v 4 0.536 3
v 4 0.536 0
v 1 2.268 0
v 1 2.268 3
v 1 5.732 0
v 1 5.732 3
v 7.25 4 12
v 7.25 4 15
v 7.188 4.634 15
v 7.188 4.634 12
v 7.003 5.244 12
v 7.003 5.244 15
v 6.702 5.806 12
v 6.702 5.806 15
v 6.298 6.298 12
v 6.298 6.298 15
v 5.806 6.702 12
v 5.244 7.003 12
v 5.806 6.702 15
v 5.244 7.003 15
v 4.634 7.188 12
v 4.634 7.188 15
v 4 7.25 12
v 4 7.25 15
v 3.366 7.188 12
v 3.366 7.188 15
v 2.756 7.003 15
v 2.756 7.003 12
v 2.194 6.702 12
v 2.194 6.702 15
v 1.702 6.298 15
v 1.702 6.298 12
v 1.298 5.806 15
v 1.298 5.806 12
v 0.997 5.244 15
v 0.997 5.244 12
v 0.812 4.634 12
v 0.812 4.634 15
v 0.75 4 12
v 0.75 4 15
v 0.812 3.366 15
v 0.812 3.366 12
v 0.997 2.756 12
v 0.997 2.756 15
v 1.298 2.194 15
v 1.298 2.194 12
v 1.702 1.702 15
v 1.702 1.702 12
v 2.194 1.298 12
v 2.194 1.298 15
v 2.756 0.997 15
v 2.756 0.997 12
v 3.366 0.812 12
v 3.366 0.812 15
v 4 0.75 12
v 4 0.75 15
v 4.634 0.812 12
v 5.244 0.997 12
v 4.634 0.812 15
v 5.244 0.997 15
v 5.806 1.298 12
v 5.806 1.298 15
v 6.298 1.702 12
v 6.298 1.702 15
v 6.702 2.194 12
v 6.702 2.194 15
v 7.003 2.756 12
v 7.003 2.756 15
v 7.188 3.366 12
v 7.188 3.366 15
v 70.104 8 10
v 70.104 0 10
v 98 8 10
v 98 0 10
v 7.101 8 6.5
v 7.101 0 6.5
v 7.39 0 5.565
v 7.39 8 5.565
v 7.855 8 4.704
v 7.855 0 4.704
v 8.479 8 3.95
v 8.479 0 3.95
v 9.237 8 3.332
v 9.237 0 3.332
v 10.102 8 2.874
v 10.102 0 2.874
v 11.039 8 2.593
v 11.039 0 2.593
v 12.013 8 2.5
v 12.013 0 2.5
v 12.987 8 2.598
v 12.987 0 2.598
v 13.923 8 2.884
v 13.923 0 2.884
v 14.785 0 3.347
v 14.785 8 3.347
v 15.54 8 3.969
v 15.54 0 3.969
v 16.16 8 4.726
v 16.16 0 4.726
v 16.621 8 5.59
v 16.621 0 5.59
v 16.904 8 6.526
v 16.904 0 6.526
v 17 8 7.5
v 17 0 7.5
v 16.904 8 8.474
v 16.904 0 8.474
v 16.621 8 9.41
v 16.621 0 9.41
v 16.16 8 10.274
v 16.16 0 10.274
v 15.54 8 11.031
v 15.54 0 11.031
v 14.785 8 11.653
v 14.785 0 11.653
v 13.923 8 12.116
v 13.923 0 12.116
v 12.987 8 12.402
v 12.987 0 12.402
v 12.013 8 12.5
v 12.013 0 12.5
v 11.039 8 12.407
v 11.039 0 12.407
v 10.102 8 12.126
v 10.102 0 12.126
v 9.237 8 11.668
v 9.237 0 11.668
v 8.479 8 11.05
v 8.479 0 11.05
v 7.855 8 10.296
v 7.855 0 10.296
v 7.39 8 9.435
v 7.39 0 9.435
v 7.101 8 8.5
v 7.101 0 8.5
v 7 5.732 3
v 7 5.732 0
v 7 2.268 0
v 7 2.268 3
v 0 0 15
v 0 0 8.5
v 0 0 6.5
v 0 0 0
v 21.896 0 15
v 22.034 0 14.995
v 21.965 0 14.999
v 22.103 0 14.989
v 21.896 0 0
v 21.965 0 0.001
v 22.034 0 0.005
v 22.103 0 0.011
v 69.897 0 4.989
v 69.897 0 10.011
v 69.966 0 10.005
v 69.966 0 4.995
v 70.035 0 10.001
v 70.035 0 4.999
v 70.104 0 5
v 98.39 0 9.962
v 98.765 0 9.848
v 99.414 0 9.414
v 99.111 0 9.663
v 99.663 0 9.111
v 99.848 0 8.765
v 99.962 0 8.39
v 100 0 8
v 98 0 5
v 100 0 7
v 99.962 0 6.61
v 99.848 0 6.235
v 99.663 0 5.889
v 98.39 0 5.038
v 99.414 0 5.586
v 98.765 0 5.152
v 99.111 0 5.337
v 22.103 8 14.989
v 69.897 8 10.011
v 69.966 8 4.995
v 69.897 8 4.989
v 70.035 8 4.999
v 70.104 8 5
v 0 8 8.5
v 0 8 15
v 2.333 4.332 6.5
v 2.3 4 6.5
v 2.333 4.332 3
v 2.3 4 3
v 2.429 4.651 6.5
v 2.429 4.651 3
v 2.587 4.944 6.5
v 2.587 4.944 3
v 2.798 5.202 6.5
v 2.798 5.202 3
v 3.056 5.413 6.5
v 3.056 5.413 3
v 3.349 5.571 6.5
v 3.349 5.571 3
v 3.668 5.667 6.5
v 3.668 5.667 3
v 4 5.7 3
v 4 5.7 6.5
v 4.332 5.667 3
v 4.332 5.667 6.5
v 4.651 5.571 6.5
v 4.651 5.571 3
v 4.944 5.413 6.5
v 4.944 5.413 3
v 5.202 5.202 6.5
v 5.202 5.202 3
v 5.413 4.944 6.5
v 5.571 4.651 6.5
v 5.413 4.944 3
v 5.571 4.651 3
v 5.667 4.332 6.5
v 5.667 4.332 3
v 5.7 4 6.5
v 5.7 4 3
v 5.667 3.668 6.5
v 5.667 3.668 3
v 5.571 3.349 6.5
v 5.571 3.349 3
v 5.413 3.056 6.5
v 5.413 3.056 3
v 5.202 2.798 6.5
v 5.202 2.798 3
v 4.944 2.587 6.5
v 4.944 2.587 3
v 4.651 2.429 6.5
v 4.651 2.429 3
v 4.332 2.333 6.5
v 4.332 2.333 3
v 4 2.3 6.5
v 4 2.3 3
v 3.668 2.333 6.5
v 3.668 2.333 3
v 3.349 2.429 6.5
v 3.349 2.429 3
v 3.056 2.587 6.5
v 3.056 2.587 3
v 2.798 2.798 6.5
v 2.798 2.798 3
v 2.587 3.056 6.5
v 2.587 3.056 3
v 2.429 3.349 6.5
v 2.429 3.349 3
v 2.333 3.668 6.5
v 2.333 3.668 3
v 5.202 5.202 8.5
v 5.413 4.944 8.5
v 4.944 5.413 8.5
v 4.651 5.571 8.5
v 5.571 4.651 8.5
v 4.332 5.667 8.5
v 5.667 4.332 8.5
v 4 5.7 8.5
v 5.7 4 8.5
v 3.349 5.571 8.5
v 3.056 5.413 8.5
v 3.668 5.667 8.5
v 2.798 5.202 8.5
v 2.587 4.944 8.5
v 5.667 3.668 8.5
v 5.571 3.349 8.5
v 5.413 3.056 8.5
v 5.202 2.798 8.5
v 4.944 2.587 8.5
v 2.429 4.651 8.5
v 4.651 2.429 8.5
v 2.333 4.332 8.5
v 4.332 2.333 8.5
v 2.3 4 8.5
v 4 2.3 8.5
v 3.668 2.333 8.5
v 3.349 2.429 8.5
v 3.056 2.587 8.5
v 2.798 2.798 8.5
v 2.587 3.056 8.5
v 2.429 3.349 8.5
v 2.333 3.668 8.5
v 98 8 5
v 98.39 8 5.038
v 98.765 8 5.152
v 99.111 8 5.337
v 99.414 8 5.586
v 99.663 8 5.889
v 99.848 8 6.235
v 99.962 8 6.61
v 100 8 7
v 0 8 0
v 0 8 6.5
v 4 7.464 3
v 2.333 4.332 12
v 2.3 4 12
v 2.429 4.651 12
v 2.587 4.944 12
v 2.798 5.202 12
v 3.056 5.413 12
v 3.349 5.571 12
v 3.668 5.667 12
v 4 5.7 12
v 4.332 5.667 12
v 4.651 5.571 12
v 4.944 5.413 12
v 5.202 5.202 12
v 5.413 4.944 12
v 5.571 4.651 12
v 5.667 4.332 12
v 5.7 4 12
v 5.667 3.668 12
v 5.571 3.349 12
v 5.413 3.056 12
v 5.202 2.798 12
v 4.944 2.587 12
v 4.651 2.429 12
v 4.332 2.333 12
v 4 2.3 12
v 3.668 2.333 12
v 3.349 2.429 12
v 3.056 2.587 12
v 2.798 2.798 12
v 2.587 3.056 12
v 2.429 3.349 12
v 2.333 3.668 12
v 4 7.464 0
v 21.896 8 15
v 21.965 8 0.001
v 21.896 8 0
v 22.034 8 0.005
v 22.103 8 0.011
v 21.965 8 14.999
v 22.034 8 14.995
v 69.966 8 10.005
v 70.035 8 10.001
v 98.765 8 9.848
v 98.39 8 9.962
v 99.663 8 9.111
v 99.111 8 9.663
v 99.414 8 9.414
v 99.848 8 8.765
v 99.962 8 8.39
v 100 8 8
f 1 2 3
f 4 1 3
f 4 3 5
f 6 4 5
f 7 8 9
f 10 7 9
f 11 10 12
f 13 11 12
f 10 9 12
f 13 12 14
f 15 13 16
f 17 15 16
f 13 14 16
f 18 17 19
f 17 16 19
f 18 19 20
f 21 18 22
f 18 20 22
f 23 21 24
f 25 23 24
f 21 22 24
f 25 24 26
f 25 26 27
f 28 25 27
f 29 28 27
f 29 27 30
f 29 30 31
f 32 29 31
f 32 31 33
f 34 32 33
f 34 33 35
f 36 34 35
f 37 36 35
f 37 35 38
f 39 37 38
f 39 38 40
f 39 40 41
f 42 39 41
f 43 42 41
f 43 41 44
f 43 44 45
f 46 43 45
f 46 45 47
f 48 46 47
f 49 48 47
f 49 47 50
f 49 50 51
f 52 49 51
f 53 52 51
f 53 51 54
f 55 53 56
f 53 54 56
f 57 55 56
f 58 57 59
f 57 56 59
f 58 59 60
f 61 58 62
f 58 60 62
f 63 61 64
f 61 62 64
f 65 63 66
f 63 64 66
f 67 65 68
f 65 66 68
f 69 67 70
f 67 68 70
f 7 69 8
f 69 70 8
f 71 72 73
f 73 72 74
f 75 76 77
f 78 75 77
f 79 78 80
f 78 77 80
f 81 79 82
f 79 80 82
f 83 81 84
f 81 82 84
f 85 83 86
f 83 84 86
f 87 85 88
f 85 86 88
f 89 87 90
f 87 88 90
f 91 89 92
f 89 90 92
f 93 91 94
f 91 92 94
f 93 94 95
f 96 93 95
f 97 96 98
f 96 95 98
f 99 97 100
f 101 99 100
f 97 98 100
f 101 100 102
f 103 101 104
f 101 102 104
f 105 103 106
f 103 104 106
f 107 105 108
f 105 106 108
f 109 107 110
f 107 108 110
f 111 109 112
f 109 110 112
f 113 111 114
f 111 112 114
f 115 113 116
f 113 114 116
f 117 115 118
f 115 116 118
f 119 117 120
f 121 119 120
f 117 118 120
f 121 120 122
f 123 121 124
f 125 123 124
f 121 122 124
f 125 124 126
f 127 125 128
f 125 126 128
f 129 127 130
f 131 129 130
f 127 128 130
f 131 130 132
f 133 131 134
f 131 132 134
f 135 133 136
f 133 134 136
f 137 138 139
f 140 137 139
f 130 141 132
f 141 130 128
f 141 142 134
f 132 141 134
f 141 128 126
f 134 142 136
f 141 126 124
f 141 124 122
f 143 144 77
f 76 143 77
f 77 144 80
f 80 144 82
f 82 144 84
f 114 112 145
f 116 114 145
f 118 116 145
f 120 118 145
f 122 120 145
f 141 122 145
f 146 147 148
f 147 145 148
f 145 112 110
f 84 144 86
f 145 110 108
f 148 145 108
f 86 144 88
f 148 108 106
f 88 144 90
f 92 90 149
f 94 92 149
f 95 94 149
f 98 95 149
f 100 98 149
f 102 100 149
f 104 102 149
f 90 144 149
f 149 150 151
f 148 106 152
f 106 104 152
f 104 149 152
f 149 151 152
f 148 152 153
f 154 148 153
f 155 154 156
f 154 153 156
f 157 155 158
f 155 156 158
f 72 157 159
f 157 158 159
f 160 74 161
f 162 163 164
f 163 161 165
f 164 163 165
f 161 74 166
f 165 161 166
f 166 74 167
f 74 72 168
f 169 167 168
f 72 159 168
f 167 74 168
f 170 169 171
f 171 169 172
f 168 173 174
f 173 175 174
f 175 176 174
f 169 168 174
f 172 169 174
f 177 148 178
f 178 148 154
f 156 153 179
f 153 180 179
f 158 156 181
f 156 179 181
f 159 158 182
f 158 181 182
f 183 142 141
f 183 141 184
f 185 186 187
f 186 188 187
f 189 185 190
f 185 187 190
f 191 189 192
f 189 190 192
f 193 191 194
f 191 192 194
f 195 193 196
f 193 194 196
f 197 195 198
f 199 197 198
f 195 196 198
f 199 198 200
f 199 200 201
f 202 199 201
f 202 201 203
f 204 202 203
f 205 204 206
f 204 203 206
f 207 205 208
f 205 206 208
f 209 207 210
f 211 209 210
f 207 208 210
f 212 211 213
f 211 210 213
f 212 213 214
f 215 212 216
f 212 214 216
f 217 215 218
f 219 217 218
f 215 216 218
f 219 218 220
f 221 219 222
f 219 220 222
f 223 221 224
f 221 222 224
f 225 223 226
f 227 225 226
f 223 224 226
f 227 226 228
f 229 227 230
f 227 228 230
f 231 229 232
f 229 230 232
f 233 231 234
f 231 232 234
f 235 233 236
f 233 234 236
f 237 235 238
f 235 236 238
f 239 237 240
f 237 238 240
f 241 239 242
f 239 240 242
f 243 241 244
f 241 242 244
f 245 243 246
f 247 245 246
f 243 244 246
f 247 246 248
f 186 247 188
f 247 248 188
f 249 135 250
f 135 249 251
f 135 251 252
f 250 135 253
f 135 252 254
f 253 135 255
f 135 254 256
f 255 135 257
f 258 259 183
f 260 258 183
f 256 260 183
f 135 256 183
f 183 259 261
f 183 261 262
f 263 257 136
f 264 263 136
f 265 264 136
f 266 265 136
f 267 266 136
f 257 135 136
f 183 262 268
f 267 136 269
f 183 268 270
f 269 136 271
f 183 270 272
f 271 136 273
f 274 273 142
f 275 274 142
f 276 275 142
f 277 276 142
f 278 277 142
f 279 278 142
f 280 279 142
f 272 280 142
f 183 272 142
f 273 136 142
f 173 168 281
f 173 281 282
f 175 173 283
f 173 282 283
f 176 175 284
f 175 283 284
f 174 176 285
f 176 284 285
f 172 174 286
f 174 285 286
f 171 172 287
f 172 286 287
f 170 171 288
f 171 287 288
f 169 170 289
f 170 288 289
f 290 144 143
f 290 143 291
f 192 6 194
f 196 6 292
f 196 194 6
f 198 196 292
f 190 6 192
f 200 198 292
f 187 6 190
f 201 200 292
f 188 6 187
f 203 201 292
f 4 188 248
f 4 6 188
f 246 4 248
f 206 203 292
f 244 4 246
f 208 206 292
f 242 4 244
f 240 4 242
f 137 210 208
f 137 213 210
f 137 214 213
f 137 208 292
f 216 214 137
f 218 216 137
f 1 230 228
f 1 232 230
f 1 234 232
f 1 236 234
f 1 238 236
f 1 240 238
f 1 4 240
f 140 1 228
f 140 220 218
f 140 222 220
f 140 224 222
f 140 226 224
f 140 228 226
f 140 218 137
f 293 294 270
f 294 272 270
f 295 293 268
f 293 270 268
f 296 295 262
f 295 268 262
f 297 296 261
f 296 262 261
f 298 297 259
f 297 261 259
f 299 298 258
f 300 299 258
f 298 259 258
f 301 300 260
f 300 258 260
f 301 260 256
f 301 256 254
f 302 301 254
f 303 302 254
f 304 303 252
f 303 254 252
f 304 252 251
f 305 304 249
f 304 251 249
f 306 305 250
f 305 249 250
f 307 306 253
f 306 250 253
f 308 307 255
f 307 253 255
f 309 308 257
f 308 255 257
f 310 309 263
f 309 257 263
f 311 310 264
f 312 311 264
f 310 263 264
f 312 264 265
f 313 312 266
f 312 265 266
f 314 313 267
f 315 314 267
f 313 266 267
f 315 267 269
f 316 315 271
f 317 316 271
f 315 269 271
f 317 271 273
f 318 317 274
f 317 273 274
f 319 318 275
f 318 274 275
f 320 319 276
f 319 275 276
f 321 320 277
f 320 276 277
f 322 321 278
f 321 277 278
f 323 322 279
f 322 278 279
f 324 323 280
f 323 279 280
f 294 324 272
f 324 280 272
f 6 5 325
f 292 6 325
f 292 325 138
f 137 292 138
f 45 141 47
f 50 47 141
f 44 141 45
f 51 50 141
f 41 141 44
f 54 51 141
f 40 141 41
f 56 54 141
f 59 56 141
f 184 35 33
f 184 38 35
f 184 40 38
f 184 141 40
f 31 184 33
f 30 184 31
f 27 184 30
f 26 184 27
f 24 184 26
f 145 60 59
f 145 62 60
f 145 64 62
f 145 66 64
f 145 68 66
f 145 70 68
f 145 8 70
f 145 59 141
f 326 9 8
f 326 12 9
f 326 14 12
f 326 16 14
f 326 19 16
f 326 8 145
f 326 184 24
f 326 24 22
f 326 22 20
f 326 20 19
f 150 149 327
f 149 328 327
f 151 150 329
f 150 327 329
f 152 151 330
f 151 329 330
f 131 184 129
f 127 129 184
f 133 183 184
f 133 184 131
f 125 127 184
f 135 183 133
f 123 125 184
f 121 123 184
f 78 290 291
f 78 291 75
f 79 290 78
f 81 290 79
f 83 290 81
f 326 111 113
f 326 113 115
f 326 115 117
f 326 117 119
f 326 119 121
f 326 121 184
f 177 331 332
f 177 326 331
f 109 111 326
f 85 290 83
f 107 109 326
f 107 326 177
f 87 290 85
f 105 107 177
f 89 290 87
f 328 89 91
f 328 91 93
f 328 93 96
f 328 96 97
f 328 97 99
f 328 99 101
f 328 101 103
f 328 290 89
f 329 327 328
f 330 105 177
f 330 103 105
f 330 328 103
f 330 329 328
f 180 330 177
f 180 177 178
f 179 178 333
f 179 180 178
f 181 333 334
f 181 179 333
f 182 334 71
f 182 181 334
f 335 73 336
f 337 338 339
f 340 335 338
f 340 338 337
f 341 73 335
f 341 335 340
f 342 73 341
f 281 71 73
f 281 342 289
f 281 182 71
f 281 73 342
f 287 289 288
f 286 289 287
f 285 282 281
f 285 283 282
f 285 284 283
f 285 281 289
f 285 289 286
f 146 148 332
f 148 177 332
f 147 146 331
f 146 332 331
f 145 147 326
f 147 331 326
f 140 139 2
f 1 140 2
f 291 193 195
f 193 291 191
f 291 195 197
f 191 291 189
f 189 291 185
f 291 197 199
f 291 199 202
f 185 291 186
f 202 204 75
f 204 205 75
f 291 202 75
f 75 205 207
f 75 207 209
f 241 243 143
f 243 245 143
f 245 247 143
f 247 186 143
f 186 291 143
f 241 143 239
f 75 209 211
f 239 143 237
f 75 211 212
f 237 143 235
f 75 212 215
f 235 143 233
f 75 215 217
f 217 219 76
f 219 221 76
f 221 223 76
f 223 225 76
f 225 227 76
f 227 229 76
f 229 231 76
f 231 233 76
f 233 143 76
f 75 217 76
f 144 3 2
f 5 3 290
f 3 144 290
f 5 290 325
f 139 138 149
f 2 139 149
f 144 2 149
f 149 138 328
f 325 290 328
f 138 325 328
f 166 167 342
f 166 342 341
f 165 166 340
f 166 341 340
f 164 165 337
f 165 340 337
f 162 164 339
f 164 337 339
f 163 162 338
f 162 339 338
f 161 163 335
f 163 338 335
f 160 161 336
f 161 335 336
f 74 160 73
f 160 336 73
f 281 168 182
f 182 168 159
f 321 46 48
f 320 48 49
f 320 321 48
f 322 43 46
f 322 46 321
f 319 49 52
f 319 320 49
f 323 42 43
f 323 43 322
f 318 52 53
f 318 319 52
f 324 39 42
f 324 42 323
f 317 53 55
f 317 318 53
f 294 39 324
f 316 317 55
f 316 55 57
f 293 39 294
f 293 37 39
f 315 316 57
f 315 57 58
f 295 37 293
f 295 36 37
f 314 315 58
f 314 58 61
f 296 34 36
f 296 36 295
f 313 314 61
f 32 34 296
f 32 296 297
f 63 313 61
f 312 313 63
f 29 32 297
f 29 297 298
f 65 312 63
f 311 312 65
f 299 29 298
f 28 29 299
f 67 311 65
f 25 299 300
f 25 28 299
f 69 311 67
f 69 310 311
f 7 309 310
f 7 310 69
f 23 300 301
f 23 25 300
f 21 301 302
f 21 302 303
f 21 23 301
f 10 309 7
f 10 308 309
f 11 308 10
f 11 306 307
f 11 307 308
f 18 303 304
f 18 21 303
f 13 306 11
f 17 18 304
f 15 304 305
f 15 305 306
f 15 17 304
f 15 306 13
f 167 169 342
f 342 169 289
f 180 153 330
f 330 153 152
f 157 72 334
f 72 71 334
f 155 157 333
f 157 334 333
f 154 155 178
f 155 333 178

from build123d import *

# Parameters (mm, degrees)
F0_W           = 100
F0_H           = 8
F1_DEPTH       = 15
F3_DEPTH       = 8
F5_DEPTH       = 3
F7_D           = 3.4
F7_DEPTH       = 15
F7_CBORE_D     = 6.5
F7_CBORE_DEPTH = 3
F7_TIP         = 1.0214630523
F8_R           = 2


# Not quite as in the source:
# - a feature names something its author has since deleted; it is built from what else it names


with BuildPart() as f1:
    # F0 (on Top) → F1 (new body)
    with BuildSketch(Plane.XY):
        with Locations((50, 4)):
            Rectangle(F0_W, F0_H)
    extrude(amount=F1_DEPTH)

    # F2 (on face) → F3 (cut, through all)
    with BuildSketch(Plane.XZ):
        Polygon((70, 5), (22, 0), (100, 0), (100, 5), align=None)
        with BuildLine():
            Line((0, 6.5), (7.1010205144, 6.5))
            ThreePointArc((7.1010205144, 6.5), (17, 7.5), (7.1010205144, 8.5))
            Line((7.1010205144, 8.5), (0, 8.5))
            Line((0, 8.5), (0, 6.5))
        make_face()
        Polygon((100, 15), (22, 15), (70, 10), (100, 10), align=None)
    extrude(amount=-F3_DEPTH, mode=Mode.SUBTRACT)

    # F4 (on face) → F5 (cut)
    with BuildSketch(Plane(origin=(0, 0, 0), x_dir=(1, 0, 0), z_dir=(0, 0, -1))):
        Polygon((4, -7.4641016151), (7, -5.7320508076), (7, -2.2679491924), (4, -0.5358983849), (1, -2.2679491924), (1, -5.7320508076), align=None)
    extrude(amount=-F5_DEPTH, mode=Mode.SUBTRACT)

    # F7
    with Locations(Plane.XY.offset(15)):
        with Locations((4, 4)):
            CounterBoreHole(F7_D / 2, F7_CBORE_D / 2, F7_CBORE_DEPTH, depth=F7_DEPTH)
            with Locations((0, 0, -(F7_DEPTH + F7_TIP / 2))):  # 118° drill point
                Cone(0, F7_D / 2, F7_TIP, mode=Mode.SUBTRACT)

    # F8
    f8_edges = [f1.edges().sort_by_distance(p)[0] for p in [
        (100, 4, 10),
        (100, 4, 5),
        (70, 4, 5),
        (70, 4, 10),
        (22, 4, 15),
        (22, 4, 0),
    ]]
    fillet(f8_edges, radius=F8_R)


solid = f1.part
